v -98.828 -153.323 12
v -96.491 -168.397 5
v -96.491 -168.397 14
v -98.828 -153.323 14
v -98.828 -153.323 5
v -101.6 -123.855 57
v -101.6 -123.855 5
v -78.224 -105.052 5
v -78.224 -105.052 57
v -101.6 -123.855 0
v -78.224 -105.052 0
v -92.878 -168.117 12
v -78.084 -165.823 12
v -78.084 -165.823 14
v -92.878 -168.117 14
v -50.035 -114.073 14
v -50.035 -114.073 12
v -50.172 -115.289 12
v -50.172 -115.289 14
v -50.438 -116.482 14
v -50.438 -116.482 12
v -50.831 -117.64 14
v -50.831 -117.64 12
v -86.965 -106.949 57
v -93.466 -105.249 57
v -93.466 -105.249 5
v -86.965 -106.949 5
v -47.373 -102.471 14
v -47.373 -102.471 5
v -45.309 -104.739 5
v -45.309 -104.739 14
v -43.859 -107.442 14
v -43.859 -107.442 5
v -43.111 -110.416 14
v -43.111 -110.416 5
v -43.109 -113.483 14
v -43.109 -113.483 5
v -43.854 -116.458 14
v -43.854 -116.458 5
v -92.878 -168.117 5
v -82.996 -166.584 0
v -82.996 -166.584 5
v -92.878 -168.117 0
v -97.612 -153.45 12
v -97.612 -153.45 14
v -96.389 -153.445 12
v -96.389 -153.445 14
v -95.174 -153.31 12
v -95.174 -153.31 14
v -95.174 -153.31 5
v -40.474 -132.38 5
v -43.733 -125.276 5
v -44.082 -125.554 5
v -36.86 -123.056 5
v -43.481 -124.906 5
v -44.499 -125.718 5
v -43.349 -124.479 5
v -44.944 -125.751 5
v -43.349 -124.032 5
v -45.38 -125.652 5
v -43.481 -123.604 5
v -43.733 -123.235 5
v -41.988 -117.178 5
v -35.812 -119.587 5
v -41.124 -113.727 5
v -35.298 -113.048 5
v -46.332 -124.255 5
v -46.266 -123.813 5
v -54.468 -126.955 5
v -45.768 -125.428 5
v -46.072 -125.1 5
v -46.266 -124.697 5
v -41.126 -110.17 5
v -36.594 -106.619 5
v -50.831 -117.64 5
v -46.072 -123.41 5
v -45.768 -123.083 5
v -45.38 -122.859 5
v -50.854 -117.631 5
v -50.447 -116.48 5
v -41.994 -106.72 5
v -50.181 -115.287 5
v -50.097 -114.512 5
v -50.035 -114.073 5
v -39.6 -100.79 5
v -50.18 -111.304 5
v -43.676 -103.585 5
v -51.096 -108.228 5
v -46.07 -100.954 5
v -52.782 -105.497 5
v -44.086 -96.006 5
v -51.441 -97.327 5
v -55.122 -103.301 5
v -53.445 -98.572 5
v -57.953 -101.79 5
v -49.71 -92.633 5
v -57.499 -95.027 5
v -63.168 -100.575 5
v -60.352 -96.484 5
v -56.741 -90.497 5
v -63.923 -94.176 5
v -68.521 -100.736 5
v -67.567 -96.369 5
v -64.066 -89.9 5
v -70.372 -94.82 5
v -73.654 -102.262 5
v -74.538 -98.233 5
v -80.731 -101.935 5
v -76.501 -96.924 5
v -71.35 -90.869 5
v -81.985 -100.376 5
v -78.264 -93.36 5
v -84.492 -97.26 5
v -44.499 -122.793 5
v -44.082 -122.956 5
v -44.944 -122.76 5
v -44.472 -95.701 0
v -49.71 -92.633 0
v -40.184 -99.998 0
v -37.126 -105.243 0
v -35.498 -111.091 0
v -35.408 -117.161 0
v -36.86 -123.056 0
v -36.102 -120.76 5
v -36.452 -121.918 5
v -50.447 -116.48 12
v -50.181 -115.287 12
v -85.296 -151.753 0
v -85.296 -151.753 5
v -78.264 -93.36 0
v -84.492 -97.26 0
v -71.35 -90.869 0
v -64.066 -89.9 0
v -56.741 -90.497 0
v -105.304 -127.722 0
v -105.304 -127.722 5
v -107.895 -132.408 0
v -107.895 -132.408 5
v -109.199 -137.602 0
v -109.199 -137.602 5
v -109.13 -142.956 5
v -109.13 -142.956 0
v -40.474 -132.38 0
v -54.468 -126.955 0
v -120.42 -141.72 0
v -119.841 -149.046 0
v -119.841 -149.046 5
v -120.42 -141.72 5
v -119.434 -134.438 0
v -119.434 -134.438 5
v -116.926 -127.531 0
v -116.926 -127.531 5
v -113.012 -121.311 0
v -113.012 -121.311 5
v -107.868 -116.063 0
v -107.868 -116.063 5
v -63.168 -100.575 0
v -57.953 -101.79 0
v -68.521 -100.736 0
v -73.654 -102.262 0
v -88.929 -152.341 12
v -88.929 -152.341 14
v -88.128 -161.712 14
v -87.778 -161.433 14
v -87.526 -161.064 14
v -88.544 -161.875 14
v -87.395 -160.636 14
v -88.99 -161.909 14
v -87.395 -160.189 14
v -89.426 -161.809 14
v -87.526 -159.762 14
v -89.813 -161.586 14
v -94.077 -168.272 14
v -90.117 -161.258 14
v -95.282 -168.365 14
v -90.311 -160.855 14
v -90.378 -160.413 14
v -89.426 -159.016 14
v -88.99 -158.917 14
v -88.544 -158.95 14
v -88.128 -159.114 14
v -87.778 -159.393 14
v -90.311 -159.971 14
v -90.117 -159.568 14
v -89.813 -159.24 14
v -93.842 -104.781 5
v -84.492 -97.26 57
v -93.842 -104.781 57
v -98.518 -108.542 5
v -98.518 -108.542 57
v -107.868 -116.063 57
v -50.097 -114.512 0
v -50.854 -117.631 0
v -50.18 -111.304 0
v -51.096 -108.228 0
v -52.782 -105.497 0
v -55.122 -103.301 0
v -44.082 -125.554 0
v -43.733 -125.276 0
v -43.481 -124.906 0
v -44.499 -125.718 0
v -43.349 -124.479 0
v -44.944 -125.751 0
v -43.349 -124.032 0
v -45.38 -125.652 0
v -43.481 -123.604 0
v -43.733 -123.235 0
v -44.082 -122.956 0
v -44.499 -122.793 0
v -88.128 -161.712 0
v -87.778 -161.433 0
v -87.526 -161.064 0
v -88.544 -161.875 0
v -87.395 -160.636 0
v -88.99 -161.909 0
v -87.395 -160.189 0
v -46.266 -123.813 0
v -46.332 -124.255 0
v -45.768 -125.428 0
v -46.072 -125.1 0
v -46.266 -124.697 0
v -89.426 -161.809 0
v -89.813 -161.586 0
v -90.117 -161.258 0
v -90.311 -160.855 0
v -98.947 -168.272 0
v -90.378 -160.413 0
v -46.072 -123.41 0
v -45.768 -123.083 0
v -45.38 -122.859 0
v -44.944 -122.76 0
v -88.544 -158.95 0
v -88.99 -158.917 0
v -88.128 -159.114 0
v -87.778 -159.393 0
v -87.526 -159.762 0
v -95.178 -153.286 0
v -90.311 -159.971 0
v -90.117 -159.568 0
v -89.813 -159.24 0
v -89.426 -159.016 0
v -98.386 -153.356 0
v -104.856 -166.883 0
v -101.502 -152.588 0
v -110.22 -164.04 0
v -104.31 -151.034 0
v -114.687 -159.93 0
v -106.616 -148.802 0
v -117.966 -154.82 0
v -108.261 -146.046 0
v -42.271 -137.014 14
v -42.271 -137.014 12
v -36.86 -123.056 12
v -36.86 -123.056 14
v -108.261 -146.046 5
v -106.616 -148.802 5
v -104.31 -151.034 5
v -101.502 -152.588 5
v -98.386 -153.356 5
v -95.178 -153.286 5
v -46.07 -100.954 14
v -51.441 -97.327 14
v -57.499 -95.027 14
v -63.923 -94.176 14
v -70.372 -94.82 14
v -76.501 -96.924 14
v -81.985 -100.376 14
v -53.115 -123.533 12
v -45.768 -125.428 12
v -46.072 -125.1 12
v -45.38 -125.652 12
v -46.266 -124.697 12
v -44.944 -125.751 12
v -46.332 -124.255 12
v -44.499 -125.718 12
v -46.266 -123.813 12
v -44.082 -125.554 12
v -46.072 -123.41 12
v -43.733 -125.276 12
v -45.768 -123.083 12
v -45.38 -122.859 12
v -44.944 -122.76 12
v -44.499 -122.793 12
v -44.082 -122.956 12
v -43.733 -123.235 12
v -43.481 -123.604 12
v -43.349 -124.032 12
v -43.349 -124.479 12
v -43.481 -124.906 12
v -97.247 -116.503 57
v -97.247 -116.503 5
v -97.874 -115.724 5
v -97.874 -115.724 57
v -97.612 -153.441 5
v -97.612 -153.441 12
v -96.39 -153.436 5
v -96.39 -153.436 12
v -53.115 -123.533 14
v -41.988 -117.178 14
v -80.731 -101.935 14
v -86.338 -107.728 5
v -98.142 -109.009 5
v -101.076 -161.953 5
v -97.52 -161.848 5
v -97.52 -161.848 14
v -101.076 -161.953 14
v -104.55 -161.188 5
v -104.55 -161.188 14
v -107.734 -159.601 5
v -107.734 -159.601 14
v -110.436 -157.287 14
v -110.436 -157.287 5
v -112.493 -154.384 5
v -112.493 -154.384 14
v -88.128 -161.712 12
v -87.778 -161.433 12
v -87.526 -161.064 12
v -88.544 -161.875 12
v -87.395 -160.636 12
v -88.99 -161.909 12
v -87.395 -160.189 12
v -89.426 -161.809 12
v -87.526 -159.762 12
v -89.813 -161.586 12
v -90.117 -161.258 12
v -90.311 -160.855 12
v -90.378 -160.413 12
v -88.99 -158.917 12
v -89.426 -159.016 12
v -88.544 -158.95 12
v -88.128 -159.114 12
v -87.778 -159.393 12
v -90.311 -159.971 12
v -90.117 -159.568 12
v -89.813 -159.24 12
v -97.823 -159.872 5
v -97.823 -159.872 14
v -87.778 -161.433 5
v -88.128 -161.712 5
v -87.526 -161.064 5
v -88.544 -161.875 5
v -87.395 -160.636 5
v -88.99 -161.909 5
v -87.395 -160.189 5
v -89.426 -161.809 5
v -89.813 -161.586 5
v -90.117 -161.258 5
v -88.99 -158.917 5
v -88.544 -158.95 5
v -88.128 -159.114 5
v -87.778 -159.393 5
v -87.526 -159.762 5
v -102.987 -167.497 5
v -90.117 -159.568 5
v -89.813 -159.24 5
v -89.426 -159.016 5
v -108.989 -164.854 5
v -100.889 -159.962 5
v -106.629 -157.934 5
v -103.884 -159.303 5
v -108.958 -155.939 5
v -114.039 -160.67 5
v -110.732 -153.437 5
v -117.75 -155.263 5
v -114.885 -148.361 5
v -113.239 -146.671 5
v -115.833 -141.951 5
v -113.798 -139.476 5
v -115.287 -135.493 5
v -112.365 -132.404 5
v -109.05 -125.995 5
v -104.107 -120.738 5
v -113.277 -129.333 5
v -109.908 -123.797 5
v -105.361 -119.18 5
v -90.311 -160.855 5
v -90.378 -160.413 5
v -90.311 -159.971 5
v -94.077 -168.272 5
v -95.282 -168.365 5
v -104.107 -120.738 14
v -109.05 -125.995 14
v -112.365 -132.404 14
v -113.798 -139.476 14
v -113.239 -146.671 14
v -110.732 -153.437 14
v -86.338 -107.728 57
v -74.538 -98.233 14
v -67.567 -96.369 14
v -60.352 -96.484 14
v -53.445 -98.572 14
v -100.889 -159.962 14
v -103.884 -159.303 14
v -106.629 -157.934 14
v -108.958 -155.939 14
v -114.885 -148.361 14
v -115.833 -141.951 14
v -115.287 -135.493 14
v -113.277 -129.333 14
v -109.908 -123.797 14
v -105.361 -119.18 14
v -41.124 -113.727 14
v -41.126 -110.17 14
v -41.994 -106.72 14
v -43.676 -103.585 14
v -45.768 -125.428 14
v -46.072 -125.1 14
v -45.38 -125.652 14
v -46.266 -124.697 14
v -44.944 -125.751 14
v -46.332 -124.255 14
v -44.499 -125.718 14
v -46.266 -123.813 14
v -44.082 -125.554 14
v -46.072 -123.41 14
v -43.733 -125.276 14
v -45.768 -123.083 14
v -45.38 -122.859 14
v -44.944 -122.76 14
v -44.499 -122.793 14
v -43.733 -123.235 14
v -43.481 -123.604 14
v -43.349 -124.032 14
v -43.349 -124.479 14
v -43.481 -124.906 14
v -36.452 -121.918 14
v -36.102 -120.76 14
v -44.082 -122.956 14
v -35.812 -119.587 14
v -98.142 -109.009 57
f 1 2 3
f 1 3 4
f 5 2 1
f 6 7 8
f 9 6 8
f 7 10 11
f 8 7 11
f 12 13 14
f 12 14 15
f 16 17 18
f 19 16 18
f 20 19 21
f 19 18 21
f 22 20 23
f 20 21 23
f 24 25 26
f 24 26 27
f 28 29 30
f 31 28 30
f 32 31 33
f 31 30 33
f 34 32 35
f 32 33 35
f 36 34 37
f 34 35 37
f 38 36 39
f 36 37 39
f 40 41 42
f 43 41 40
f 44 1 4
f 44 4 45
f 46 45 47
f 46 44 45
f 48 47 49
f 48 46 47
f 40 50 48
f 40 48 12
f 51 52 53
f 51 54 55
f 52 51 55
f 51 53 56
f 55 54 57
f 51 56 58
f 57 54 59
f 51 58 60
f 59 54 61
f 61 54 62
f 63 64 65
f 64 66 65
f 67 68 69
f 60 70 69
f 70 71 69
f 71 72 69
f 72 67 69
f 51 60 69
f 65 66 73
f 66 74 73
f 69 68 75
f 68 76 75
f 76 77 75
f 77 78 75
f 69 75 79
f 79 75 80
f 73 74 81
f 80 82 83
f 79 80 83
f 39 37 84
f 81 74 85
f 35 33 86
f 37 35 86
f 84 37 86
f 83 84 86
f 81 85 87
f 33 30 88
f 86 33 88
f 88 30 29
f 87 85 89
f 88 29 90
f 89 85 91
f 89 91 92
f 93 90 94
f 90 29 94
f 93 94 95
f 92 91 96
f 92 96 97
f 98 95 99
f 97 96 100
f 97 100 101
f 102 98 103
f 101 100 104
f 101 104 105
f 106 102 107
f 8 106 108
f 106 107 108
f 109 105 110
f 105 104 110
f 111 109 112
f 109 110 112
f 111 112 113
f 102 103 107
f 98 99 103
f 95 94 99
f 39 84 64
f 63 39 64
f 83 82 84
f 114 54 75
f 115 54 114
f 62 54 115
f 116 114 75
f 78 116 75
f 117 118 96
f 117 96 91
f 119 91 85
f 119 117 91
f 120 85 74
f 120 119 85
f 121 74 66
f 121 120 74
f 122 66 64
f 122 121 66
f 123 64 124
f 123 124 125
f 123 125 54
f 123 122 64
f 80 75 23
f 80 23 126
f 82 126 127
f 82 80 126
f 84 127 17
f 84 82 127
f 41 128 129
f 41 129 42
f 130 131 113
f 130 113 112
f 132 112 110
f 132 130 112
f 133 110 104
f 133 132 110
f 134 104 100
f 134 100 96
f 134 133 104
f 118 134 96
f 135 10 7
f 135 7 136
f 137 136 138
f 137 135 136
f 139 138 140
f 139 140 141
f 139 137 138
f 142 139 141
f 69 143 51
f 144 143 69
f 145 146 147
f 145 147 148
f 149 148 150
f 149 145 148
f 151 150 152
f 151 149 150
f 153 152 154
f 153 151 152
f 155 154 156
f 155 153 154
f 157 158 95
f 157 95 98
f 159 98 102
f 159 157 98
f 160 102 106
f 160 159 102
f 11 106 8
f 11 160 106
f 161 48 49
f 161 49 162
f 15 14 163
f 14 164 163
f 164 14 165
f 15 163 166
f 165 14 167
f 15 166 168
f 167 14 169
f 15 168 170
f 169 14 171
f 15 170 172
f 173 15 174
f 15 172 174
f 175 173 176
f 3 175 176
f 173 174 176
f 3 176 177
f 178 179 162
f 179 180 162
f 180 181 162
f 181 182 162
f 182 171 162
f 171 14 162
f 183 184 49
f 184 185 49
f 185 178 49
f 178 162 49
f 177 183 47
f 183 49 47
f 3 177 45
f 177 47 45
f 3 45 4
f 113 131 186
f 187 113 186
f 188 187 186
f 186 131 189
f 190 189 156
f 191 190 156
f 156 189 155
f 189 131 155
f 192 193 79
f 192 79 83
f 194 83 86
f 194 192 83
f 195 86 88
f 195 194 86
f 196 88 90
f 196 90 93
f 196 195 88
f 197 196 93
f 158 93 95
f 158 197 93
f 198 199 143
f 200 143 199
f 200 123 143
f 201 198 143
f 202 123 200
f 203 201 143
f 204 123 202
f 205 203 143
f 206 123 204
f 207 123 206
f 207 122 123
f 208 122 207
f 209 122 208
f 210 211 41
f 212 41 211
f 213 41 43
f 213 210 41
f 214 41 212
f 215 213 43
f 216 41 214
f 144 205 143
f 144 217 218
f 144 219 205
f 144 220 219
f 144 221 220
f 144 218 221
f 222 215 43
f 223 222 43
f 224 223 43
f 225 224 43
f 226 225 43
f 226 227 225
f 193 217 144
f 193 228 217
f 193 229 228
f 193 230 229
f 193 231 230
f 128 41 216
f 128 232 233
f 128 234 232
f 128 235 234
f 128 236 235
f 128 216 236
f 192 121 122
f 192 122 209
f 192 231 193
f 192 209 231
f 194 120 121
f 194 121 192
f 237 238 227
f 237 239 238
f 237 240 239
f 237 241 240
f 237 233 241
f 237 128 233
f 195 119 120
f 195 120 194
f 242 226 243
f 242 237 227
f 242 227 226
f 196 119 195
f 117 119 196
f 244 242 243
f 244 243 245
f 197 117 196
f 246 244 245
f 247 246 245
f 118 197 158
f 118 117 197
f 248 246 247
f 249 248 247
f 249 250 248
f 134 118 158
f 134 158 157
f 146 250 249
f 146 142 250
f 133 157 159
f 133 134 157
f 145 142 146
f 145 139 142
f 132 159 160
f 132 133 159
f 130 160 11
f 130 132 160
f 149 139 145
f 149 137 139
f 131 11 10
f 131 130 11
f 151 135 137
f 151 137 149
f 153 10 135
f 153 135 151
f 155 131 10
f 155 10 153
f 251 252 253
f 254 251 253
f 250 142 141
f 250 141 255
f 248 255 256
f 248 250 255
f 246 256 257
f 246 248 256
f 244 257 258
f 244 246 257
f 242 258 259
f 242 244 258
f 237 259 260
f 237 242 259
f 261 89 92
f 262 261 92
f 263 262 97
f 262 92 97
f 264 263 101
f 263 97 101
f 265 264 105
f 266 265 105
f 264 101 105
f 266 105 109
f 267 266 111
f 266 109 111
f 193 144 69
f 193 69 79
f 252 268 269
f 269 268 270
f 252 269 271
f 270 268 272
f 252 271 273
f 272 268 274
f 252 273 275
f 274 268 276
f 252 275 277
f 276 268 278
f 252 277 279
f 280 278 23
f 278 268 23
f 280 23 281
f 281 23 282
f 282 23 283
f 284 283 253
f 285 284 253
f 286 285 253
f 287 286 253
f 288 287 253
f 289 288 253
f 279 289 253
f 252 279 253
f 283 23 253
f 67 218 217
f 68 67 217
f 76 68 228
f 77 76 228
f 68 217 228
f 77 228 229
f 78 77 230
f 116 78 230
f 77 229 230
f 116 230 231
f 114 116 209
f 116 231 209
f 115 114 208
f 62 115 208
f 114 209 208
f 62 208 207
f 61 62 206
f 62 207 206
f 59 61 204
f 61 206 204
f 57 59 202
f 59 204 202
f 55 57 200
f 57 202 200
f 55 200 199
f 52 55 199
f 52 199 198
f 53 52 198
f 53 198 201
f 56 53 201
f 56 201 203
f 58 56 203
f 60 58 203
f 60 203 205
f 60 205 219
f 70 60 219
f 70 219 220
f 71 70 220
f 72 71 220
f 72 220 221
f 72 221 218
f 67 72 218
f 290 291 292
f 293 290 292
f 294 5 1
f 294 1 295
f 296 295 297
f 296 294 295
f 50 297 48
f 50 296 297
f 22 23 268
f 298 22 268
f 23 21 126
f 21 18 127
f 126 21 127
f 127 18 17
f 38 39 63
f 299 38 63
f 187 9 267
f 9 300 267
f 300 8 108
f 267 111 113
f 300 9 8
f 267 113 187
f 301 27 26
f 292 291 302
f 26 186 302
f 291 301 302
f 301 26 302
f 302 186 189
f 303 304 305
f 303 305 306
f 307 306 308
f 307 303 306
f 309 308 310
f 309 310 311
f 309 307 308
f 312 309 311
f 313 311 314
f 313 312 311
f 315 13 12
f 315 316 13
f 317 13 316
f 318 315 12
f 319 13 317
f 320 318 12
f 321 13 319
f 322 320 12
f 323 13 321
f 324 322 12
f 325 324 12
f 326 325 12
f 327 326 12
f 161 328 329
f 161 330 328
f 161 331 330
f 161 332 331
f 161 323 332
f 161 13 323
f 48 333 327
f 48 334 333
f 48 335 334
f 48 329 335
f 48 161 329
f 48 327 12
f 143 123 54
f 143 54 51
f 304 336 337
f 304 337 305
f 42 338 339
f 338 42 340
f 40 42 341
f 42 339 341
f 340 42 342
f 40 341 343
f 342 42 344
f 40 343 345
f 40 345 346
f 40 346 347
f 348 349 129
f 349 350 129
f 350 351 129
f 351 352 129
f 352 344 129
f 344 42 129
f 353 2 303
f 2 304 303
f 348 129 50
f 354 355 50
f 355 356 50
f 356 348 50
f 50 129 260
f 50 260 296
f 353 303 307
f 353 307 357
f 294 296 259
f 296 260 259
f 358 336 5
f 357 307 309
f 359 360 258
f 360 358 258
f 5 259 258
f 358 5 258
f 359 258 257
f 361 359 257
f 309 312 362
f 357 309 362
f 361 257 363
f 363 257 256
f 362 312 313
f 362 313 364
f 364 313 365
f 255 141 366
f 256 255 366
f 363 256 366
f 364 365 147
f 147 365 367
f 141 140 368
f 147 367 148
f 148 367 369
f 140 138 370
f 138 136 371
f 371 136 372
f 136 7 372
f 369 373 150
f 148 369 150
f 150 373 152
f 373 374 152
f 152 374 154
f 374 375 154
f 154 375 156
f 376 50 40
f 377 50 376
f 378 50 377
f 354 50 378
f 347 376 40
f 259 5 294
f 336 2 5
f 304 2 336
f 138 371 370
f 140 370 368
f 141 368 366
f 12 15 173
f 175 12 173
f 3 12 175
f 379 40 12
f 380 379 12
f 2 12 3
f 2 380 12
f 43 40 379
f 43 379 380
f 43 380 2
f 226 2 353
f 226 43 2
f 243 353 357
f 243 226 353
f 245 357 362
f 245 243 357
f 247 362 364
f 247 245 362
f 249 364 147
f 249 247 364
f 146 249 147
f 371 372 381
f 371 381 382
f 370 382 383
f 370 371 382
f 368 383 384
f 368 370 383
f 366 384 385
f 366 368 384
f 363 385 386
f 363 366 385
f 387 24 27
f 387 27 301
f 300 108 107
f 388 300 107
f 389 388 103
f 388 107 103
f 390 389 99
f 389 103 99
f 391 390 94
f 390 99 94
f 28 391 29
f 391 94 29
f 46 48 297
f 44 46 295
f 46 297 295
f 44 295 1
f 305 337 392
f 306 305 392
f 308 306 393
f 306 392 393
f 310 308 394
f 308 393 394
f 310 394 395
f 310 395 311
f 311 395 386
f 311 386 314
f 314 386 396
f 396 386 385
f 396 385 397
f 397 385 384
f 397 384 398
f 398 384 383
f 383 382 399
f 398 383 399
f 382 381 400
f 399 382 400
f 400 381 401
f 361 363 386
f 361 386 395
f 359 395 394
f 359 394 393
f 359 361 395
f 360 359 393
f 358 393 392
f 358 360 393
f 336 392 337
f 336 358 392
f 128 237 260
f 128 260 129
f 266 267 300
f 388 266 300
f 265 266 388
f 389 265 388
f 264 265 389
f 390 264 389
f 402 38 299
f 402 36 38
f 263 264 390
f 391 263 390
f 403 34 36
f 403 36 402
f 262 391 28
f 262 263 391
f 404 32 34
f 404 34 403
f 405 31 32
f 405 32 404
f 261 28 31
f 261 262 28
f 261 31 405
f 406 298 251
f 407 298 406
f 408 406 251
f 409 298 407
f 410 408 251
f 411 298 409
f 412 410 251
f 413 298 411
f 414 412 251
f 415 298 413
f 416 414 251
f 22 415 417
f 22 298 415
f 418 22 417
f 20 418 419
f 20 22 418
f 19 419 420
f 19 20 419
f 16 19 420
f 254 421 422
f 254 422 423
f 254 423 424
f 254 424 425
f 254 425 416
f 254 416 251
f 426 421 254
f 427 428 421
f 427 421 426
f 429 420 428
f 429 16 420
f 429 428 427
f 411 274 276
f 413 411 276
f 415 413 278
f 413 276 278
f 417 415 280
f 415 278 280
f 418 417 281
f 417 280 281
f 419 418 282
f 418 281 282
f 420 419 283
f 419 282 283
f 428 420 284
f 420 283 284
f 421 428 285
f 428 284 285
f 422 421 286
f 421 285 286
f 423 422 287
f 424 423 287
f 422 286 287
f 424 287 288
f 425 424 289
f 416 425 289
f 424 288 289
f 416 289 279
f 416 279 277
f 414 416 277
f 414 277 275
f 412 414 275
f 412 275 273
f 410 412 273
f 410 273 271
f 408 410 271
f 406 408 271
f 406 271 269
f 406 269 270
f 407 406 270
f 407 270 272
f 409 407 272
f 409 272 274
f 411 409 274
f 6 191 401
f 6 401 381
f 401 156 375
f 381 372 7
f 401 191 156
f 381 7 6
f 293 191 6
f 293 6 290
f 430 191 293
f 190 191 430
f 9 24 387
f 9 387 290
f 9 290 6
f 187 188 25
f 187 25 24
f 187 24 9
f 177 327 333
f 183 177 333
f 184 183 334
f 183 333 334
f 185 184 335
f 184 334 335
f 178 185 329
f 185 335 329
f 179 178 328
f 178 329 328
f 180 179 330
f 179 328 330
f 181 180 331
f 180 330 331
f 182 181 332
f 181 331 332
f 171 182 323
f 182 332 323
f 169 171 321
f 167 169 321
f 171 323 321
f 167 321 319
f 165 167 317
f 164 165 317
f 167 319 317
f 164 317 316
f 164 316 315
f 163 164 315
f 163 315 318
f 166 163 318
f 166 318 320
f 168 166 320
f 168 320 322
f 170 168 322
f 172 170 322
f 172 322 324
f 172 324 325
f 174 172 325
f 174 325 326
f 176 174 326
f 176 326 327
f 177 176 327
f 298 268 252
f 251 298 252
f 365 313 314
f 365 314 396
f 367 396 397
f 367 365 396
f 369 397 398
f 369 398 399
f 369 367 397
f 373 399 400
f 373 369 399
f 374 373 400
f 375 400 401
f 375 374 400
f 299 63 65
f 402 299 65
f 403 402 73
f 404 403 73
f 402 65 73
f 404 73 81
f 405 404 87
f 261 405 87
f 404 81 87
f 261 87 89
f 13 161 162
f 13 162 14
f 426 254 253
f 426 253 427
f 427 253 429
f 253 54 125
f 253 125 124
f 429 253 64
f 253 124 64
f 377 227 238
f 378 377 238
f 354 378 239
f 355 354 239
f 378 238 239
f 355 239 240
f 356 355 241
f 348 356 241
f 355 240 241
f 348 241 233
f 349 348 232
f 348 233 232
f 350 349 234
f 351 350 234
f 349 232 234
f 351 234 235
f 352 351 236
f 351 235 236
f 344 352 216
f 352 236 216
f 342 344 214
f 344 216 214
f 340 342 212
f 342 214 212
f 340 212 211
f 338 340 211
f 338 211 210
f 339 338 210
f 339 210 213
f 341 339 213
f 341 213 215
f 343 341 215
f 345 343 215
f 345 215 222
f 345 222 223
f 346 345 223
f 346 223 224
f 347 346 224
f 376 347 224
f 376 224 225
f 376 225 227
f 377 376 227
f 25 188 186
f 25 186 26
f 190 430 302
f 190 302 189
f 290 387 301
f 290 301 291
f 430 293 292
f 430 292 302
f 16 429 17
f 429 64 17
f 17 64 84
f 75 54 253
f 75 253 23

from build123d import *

# Parameters (mm, degrees)
ESTRUSIONE_ESTRUSIONE1_DEPTH = 5
ESTRUSIONE_ESTRUSIONE2_DEPTH = 7
ESTRUSIONE_ESTRUSIONE3_DEPTH = 2
ESTRUSIONE_ESTRUSIONE4_DEPTH = 52
TAGLIO_ESTRUSIONE2_DEPTH     = 52
ESTRUSIONE_ESTRUSIONE5_DEPTH = 9
FORI_FILETTATI_3_0MM1_D      = 3


with BuildPart() as part:
    # Schizzo1 → Estrusione-Estrusione1 (new body)
    with BuildSketch(Plane.XY):
        with BuildLine():
            Line((-82.995904107, -166.584374689), (-92.877799089, -168.116742646))
            ThreePointArc((-92.877799089, -168.116742646), (-110.220012955, -164.040092202), (-119.840608042, -149.046239769))
            ThreePointArc((-119.840608042, -149.046239769), (-118.364815633, -130.917411526), (-107.867932944, -116.063192243))
            Line((-107.867932944, -116.063192243), (-84.49215827, -97.259651129))
            ThreePointArc((-84.49215827, -97.259651129), (-67.733683115, -90.189581316), (-49.709718148, -92.632748029))
            ThreePointArc((-49.709718148, -92.632748029), (-37.125664022, -105.242785395), (-36.859828578, -123.055724291))
            Line((-36.859828578, -123.055724291), (-40.474113425, -132.379722631))
            Line((-40.474113425, -132.379722631), (-54.467826156, -126.955304689))
            Line((-54.467826156, -126.955304689), (-50.853541308, -117.631306349))
            ThreePointArc((-50.853541308, -117.631306349), (-51.095893898, -108.22813541), (-57.953355129, -101.789689638))
            ThreePointArc((-57.953355129, -101.789689638), (-68.520842721, -100.735914417), (-78.224311232, -105.051576021))
            Line((-78.224311232, -105.051576021), (-101.600085906, -123.855117134))
            ThreePointArc((-101.600085906, -123.855117134), (-107.894780127, -132.408424149), (-109.129903142, -142.956253658))
            ThreePointArc((-109.129903142, -142.956253658), (-104.310440062, -151.034071069), (-95.177618995, -153.285723315))
            Line((-95.177618995, -153.285723315), (-85.295724012, -151.753355358))
            Line((-85.295724012, -151.753355358), (-82.995904107, -166.584374689))
        make_face()
    extrude(amount=ESTRUSIONE_ESTRUSIONE1_DEPTH)

    # Schizzo2 → Estrusione-Estrusione2 (add)
    with BuildSketch(Plane.XY.offset(5)):
        with BuildLine():
            Line((-36.859828578, -123.055724291), (-50.830842779, -117.640105037))
            ThreePointArc((-50.830842779, -117.640105037), (-50.298673229, -115.886666013), (-50.034997321, -114.073318872))
            Line((-50.034997321, -114.073318872), (-35.811832194, -119.586680021))
            ThreePointArc((-35.811832194, -119.586680021), (-36.269524014, -121.341233275), (-36.859828578, -123.055724291))
        make_face()
        with BuildLine():
            Line((-96.490830562, -168.397042736), (-98.828360202, -153.322841843))
            ThreePointArc((-98.828360202, -153.322841843), (-97.000632762, -153.453858051), (-95.173888567, -153.309779998))
            Line((-95.173888567, -153.309779998), (-92.877799089, -168.116742646))
            ThreePointArc((-92.877799089, -168.116742646), (-94.678957246, -168.325951195), (-96.490830562, -168.397042736))
        make_face()
    extrude(amount=ESTRUSIONE_ESTRUSIONE2_DEPTH)

    # Schizzo3 → Estrusione-Estrusione3 (add)
    with BuildSketch(Plane.XY.offset(12)):
        with BuildLine():
            Line((-42.270578454, -137.014176653), (-36.859828578, -123.055724291))
            ThreePointArc((-36.859828578, -123.055724291), (-36.269524014, -121.341233275), (-35.811832194, -119.586680021))
            Line((-35.811832194, -119.586680021), (-50.034997321, -114.073318872))
            ThreePointArc((-50.034997321, -114.073318872), (-50.288758238, -115.888878313), (-50.830842779, -117.640105037))
            Line((-50.830842779, -117.640105037), (-53.115040991, -123.532795079))
            Line((-53.115040991, -123.532795079), (-42.270578454, -137.014176653))
        make_face()
        with BuildLine():
            Line((-96.490830562, -168.397042736), (-98.828360202, -153.322841843))
            ThreePointArc((-98.828360202, -153.322841843), (-97.000596453, -153.464016791), (-95.173888567, -153.309779998))
            Line((-95.173888567, -153.309779998), (-88.928612449, -152.34133609))
            Line((-88.928612449, -152.34133609), (-78.084149913, -165.822717664))
            Line((-78.084149913, -165.822717664), (-92.877799089, -168.116742646))
            ThreePointArc((-92.877799089, -168.116742646), (-94.678957246, -168.325951195), (-96.490830562, -168.397042736))
        make_face()
    extrude(amount=ESTRUSIONE_ESTRUSIONE3_DEPTH)

    # Schizzo4 → Estrusione-Estrusione4 (add)
    with BuildSketch(Plane.XY.offset(5)):
        Polygon((-101.600085906, -123.855117134), (-78.224311232, -105.051576021), (-84.49215827, -97.259651129), (-107.867932944, -116.063192243), align=None)
    extrude(amount=ESTRUSIONE_ESTRUSIONE4_DEPTH)

    # Schizzo5 → Taglio-Estrusione2 (cut)
    with BuildSketch(Plane.XY.offset(57)):
        Polygon((-97.246900104, -116.503262037), (-97.873684808, -115.724069548), (-98.141552252, -109.009291291), (-98.517623074, -108.541775798), (-93.842468139, -104.781067575), (-93.466397317, -105.248583068), (-86.96498996, -106.949083694), (-86.338205256, -107.728276184), align=None)
    extrude(amount=-TAGLIO_ESTRUSIONE2_DEPTH, mode=Mode.SUBTRACT)

    # Schizzo6 → Estrusione-Estrusione5 (add)
    with BuildSketch(Plane.XY.offset(5)):
        with BuildLine():
            Line((-105.360794128, -119.1799622), (-104.107224721, -120.738347178))
            ThreePointArc((-104.107224721, -120.738347178), (-113.327097811, -135.89060806), (-110.731703589, -153.436576214))
            ThreePointArc((-110.731703589, -153.436576214), (-105.298812913, -158.702833766), (-97.823256998, -159.87152255))
            Line((-97.823256998, -159.87152255), (-97.519846298, -161.848374074))
            ThreePointArc((-97.519846298, -161.848374074), (-106.191101066, -160.49275607), (-112.492970749, -154.384172115))
            ThreePointArc((-112.492970749, -154.384172115), (-115.28727508, -135.493487076), (-105.360794128, -119.1799622))
        make_face()
        with BuildLine():
            Line((-43.853805634, -116.458338954), (-41.987888093, -117.178305432))
            ThreePointArc((-41.987888093, -117.178305432), (-41.453924934, -108.417983362), (-46.070241465, -100.953535552))
            ThreePointArc((-46.070241465, -100.953535552), (-63.923362402, -94.176206375), (-81.985019455, -100.376421086))
            Line((-81.985019455, -100.376421086), (-80.731450047, -101.934806064))
            ThreePointArc((-80.731450047, -101.934806064), (-63.955496248, -96.175948212), (-47.373234104, -102.470839142))
            ThreePointArc((-47.373234104, -102.470839142), (-43.393471858, -108.905997429), (-43.853805634, -116.458338954))
        make_face()
    extrude(amount=ESTRUSIONE_ESTRUSIONE5_DEPTH)

    # Fori filettati Ø3.0mm1 (through all)
    with Locations(Plane.XY.offset(14)):
        with Locations((-88.877799089, -160.412808131), (-44.832341355, -124.255324234)):
            Hole(FORI_FILETTATI_3_0MM1_D / 2)


solid = part.part
